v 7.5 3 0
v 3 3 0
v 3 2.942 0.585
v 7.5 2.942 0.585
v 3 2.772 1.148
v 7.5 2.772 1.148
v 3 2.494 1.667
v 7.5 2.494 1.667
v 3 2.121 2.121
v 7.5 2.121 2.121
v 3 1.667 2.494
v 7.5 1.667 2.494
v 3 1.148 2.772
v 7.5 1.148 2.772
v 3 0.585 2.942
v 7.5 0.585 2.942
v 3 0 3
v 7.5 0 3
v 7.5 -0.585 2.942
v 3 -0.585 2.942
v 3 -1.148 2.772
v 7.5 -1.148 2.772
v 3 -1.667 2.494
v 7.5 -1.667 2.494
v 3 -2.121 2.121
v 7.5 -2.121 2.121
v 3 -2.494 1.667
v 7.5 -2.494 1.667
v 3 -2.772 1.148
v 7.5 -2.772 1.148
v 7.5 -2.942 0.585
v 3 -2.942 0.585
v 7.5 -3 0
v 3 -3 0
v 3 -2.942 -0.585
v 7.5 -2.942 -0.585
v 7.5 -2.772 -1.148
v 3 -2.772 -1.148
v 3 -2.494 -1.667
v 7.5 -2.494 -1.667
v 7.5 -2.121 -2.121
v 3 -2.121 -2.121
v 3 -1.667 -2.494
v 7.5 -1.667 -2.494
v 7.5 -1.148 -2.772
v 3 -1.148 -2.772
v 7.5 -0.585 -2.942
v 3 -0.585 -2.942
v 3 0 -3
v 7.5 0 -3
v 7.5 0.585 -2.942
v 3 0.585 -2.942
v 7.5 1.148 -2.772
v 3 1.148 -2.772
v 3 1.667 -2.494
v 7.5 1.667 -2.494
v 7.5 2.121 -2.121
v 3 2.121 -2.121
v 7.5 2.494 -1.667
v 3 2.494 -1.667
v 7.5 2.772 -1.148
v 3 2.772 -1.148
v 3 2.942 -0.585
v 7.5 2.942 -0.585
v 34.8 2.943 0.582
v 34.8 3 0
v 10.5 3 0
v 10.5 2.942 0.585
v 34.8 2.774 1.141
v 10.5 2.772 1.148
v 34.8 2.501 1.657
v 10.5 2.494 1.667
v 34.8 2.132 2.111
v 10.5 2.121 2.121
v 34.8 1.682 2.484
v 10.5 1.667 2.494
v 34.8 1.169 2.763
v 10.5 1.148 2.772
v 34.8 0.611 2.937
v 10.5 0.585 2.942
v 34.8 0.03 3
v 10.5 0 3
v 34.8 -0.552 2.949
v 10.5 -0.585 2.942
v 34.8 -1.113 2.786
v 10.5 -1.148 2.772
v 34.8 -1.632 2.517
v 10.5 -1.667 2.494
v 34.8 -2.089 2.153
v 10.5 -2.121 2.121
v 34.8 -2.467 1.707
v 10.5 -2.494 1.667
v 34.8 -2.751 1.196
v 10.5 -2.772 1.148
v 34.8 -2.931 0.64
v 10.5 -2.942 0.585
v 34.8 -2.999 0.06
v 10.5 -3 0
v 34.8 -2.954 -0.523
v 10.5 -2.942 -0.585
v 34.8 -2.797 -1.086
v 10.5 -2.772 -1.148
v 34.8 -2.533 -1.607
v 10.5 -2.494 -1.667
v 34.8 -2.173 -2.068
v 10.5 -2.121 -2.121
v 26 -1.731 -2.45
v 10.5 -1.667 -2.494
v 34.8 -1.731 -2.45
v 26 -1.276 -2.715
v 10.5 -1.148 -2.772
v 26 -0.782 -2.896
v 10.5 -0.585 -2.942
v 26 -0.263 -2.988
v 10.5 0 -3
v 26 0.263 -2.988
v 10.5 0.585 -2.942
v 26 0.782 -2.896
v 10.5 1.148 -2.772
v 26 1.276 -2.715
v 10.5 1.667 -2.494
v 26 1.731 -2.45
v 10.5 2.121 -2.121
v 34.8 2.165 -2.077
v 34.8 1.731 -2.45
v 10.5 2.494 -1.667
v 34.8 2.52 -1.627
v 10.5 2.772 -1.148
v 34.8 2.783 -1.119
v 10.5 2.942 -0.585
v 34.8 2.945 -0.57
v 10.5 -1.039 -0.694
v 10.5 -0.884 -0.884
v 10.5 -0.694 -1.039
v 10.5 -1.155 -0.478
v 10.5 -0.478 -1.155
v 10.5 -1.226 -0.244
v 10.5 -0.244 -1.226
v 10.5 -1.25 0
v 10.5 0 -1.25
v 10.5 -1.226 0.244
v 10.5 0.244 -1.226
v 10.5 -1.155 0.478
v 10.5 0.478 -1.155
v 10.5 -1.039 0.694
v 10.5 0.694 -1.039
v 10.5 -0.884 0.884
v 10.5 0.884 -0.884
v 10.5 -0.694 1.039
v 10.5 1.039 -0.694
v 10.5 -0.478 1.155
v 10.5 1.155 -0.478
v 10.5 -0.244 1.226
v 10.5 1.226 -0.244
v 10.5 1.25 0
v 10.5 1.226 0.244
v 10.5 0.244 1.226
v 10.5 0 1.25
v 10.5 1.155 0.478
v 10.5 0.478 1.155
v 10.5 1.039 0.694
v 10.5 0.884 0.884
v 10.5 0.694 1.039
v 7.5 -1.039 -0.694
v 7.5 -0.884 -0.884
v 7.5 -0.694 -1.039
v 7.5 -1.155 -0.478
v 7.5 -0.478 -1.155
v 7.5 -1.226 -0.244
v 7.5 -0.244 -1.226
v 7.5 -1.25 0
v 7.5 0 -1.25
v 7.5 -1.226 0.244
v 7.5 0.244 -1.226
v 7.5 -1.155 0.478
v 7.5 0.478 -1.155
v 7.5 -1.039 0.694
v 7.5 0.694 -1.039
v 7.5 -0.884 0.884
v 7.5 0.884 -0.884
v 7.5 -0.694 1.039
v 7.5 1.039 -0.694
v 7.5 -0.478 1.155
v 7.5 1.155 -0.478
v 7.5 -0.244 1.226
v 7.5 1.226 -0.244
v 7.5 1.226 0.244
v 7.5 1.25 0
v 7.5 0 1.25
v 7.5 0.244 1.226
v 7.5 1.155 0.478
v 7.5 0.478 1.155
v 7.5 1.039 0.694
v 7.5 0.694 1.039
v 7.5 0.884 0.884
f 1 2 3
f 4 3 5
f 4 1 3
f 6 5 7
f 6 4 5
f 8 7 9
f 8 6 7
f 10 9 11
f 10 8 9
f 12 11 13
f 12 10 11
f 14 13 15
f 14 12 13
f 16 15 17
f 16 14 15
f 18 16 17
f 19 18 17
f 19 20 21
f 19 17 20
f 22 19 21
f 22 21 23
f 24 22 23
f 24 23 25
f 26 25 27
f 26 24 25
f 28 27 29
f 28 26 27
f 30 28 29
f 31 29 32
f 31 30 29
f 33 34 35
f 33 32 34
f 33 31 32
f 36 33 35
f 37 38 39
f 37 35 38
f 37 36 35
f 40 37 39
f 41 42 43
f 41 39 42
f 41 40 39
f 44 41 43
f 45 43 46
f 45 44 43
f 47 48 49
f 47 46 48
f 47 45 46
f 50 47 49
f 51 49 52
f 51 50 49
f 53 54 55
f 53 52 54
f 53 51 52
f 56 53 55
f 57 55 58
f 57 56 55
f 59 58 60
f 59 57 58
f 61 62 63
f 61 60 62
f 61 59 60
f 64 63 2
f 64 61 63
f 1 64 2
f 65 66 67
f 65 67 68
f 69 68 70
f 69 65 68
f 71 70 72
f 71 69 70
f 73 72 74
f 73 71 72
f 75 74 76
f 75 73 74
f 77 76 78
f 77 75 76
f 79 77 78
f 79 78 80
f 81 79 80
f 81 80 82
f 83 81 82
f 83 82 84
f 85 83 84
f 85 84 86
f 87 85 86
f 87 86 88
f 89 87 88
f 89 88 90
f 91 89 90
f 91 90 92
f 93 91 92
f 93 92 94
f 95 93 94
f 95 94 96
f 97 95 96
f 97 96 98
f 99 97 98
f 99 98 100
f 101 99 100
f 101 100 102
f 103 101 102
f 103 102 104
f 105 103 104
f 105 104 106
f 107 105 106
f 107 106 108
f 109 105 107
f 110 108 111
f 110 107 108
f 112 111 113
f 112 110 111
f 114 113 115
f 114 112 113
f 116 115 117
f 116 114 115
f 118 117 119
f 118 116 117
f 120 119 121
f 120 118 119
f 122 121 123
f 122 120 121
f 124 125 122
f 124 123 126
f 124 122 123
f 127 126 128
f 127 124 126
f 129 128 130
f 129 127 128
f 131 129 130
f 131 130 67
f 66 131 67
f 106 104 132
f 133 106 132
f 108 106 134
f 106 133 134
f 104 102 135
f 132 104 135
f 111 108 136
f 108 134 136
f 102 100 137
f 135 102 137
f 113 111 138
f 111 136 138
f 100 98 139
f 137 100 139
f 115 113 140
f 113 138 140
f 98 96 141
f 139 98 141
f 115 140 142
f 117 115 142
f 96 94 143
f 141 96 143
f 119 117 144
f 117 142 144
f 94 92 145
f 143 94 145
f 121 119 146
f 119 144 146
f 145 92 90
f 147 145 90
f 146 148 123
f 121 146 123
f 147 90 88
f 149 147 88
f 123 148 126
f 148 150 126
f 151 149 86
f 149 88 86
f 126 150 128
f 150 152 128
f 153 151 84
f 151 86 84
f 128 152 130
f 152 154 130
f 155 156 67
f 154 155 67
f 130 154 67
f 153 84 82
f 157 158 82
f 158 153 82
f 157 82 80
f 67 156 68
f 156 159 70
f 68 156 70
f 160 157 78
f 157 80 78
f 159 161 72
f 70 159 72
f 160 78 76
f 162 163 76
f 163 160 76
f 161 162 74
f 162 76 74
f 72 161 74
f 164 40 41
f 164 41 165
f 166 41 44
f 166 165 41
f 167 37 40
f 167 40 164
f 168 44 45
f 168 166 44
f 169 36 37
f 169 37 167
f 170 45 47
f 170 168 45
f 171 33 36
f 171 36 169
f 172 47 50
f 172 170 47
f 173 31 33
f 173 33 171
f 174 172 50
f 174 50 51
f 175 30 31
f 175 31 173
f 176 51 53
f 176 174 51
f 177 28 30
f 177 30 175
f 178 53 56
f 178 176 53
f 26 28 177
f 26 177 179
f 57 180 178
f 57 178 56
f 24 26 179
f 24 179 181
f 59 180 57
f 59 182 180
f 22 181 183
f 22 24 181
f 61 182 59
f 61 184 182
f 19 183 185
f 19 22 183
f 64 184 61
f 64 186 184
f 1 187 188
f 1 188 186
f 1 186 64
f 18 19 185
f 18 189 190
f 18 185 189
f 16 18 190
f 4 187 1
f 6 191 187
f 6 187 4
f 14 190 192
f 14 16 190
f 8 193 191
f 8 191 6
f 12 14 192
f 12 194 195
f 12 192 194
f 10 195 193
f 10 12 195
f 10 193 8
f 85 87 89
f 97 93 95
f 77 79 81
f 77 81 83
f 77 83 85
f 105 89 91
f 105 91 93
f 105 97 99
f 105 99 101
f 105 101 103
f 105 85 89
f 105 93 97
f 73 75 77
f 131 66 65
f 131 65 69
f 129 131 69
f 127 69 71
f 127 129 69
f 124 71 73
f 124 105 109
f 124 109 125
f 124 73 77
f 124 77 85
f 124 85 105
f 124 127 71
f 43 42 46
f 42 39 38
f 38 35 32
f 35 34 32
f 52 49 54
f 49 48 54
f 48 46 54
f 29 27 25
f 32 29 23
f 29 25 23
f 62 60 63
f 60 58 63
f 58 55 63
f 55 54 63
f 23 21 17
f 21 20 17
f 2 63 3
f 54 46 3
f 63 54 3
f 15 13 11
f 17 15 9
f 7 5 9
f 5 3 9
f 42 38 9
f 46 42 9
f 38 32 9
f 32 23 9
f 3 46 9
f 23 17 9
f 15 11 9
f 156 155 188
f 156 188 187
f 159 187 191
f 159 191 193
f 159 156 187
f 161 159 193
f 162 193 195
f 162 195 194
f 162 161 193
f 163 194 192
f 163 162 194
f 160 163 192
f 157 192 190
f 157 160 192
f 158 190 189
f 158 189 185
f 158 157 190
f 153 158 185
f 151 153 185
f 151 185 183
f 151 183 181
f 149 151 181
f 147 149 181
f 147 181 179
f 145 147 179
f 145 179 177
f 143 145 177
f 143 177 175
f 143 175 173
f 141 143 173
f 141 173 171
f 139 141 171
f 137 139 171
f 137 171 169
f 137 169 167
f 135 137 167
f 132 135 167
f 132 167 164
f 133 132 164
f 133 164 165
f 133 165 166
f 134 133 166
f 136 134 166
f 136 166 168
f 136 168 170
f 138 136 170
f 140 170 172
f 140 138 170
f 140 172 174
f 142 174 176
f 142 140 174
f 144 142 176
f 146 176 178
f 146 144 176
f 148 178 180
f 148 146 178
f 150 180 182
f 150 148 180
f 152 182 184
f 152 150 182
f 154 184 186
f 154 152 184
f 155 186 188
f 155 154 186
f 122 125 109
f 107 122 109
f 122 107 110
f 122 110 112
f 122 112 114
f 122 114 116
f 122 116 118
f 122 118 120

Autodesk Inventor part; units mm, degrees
ref_plane "Start Plane" through (0, 0, 0) normal (1, 0, 0) x (0, 1, 0)
ref_plane "XZ Plane" through (0, 0, 0) normal (0, 1, 0) x (-1, 0, 0)
sketch "Main Sketch" plane through (0, 0, 0) normal (0, 0, 1) x (1, 0, 0)
  line L0 (0, 0) -> (37.5, 0)
  line L1 (0, 0) -> (0, 1.205)
  line L2 (0, 1.205) -> (3, 1.205)
  line L3 (3, 1.205) -> (3, 3)
  line L4 (7.5, 3) -> (7.5, 1.25)
  line L5 (3, 3) -> (7.5, 3)
  line L6 (7.5, 1.25) -> (10.5, 1.25)
  line L7 (10.5, 1.25) -> (10.5, 3)
  line L8 (37.5, 3) -> (37.5, 0)
  line L9 (10.5, 3) -> (37.5, 3)
  dimension "d3" = 2.41
  dimension "d4" = 6
  dimension "d5" = 2.5
  dimension "d6" = 6
revolve "Revolution1" add sketch "Main Sketch" angle 360 about axis through (0, 0, 0) along (1, 0, 0)
sketch "Sketch3" plane through (37.5, 0, 0) normal (1, 0, 0) x (0, 0, -1)
  circle A0 centre (0, 0) radius 3 projected
  circle A1 centre (0, 0) radius 3 projected
  line L0 (2.45, 1.7313) -> (2.45, -1.7313)
  dimension "d8" = 5.45
extrude "Extrusion1" cut sketch "Sketch3" against normal blind 11.5 contours A0 L0 picked at (2.5504, -0.3987)
ref_plane "Work Plane1" through (32.075, -15, -15) normal (1, 0, 0) x (0, 1, 0)
sketch "Sketch5" plane through (37.5, 0, 0) normal (1, 0, 0) x (0, 0, -1)
  line L0 (2.45, -1.7313) -> (2.45, 1.7313) projected
  arc A0 (2.45, 1.7313) -> (2.45, -1.7313) centre (0, 0) ccw projected
extrude "Extrusion3" cut sketch "Sketch5" against normal blind 2.7
sketch "Sketch6" plane through (0, 0, 0) normal (-1, 0, 0) x (0, 0, 1)
  circle A0 centre (0, 0) radius 1.205 projected
  circle A1 centre (0, 0) radius 1.205 projected
  circle A2 centre (0, 0) radius 3 projected
extrude "Extrusion4" cut sketch "Sketch6" against normal up to surface (3 mm away) contours A0 | A2
equation "\"Length\" = 37.5"
properties part number "Shaft" material "Steel"
